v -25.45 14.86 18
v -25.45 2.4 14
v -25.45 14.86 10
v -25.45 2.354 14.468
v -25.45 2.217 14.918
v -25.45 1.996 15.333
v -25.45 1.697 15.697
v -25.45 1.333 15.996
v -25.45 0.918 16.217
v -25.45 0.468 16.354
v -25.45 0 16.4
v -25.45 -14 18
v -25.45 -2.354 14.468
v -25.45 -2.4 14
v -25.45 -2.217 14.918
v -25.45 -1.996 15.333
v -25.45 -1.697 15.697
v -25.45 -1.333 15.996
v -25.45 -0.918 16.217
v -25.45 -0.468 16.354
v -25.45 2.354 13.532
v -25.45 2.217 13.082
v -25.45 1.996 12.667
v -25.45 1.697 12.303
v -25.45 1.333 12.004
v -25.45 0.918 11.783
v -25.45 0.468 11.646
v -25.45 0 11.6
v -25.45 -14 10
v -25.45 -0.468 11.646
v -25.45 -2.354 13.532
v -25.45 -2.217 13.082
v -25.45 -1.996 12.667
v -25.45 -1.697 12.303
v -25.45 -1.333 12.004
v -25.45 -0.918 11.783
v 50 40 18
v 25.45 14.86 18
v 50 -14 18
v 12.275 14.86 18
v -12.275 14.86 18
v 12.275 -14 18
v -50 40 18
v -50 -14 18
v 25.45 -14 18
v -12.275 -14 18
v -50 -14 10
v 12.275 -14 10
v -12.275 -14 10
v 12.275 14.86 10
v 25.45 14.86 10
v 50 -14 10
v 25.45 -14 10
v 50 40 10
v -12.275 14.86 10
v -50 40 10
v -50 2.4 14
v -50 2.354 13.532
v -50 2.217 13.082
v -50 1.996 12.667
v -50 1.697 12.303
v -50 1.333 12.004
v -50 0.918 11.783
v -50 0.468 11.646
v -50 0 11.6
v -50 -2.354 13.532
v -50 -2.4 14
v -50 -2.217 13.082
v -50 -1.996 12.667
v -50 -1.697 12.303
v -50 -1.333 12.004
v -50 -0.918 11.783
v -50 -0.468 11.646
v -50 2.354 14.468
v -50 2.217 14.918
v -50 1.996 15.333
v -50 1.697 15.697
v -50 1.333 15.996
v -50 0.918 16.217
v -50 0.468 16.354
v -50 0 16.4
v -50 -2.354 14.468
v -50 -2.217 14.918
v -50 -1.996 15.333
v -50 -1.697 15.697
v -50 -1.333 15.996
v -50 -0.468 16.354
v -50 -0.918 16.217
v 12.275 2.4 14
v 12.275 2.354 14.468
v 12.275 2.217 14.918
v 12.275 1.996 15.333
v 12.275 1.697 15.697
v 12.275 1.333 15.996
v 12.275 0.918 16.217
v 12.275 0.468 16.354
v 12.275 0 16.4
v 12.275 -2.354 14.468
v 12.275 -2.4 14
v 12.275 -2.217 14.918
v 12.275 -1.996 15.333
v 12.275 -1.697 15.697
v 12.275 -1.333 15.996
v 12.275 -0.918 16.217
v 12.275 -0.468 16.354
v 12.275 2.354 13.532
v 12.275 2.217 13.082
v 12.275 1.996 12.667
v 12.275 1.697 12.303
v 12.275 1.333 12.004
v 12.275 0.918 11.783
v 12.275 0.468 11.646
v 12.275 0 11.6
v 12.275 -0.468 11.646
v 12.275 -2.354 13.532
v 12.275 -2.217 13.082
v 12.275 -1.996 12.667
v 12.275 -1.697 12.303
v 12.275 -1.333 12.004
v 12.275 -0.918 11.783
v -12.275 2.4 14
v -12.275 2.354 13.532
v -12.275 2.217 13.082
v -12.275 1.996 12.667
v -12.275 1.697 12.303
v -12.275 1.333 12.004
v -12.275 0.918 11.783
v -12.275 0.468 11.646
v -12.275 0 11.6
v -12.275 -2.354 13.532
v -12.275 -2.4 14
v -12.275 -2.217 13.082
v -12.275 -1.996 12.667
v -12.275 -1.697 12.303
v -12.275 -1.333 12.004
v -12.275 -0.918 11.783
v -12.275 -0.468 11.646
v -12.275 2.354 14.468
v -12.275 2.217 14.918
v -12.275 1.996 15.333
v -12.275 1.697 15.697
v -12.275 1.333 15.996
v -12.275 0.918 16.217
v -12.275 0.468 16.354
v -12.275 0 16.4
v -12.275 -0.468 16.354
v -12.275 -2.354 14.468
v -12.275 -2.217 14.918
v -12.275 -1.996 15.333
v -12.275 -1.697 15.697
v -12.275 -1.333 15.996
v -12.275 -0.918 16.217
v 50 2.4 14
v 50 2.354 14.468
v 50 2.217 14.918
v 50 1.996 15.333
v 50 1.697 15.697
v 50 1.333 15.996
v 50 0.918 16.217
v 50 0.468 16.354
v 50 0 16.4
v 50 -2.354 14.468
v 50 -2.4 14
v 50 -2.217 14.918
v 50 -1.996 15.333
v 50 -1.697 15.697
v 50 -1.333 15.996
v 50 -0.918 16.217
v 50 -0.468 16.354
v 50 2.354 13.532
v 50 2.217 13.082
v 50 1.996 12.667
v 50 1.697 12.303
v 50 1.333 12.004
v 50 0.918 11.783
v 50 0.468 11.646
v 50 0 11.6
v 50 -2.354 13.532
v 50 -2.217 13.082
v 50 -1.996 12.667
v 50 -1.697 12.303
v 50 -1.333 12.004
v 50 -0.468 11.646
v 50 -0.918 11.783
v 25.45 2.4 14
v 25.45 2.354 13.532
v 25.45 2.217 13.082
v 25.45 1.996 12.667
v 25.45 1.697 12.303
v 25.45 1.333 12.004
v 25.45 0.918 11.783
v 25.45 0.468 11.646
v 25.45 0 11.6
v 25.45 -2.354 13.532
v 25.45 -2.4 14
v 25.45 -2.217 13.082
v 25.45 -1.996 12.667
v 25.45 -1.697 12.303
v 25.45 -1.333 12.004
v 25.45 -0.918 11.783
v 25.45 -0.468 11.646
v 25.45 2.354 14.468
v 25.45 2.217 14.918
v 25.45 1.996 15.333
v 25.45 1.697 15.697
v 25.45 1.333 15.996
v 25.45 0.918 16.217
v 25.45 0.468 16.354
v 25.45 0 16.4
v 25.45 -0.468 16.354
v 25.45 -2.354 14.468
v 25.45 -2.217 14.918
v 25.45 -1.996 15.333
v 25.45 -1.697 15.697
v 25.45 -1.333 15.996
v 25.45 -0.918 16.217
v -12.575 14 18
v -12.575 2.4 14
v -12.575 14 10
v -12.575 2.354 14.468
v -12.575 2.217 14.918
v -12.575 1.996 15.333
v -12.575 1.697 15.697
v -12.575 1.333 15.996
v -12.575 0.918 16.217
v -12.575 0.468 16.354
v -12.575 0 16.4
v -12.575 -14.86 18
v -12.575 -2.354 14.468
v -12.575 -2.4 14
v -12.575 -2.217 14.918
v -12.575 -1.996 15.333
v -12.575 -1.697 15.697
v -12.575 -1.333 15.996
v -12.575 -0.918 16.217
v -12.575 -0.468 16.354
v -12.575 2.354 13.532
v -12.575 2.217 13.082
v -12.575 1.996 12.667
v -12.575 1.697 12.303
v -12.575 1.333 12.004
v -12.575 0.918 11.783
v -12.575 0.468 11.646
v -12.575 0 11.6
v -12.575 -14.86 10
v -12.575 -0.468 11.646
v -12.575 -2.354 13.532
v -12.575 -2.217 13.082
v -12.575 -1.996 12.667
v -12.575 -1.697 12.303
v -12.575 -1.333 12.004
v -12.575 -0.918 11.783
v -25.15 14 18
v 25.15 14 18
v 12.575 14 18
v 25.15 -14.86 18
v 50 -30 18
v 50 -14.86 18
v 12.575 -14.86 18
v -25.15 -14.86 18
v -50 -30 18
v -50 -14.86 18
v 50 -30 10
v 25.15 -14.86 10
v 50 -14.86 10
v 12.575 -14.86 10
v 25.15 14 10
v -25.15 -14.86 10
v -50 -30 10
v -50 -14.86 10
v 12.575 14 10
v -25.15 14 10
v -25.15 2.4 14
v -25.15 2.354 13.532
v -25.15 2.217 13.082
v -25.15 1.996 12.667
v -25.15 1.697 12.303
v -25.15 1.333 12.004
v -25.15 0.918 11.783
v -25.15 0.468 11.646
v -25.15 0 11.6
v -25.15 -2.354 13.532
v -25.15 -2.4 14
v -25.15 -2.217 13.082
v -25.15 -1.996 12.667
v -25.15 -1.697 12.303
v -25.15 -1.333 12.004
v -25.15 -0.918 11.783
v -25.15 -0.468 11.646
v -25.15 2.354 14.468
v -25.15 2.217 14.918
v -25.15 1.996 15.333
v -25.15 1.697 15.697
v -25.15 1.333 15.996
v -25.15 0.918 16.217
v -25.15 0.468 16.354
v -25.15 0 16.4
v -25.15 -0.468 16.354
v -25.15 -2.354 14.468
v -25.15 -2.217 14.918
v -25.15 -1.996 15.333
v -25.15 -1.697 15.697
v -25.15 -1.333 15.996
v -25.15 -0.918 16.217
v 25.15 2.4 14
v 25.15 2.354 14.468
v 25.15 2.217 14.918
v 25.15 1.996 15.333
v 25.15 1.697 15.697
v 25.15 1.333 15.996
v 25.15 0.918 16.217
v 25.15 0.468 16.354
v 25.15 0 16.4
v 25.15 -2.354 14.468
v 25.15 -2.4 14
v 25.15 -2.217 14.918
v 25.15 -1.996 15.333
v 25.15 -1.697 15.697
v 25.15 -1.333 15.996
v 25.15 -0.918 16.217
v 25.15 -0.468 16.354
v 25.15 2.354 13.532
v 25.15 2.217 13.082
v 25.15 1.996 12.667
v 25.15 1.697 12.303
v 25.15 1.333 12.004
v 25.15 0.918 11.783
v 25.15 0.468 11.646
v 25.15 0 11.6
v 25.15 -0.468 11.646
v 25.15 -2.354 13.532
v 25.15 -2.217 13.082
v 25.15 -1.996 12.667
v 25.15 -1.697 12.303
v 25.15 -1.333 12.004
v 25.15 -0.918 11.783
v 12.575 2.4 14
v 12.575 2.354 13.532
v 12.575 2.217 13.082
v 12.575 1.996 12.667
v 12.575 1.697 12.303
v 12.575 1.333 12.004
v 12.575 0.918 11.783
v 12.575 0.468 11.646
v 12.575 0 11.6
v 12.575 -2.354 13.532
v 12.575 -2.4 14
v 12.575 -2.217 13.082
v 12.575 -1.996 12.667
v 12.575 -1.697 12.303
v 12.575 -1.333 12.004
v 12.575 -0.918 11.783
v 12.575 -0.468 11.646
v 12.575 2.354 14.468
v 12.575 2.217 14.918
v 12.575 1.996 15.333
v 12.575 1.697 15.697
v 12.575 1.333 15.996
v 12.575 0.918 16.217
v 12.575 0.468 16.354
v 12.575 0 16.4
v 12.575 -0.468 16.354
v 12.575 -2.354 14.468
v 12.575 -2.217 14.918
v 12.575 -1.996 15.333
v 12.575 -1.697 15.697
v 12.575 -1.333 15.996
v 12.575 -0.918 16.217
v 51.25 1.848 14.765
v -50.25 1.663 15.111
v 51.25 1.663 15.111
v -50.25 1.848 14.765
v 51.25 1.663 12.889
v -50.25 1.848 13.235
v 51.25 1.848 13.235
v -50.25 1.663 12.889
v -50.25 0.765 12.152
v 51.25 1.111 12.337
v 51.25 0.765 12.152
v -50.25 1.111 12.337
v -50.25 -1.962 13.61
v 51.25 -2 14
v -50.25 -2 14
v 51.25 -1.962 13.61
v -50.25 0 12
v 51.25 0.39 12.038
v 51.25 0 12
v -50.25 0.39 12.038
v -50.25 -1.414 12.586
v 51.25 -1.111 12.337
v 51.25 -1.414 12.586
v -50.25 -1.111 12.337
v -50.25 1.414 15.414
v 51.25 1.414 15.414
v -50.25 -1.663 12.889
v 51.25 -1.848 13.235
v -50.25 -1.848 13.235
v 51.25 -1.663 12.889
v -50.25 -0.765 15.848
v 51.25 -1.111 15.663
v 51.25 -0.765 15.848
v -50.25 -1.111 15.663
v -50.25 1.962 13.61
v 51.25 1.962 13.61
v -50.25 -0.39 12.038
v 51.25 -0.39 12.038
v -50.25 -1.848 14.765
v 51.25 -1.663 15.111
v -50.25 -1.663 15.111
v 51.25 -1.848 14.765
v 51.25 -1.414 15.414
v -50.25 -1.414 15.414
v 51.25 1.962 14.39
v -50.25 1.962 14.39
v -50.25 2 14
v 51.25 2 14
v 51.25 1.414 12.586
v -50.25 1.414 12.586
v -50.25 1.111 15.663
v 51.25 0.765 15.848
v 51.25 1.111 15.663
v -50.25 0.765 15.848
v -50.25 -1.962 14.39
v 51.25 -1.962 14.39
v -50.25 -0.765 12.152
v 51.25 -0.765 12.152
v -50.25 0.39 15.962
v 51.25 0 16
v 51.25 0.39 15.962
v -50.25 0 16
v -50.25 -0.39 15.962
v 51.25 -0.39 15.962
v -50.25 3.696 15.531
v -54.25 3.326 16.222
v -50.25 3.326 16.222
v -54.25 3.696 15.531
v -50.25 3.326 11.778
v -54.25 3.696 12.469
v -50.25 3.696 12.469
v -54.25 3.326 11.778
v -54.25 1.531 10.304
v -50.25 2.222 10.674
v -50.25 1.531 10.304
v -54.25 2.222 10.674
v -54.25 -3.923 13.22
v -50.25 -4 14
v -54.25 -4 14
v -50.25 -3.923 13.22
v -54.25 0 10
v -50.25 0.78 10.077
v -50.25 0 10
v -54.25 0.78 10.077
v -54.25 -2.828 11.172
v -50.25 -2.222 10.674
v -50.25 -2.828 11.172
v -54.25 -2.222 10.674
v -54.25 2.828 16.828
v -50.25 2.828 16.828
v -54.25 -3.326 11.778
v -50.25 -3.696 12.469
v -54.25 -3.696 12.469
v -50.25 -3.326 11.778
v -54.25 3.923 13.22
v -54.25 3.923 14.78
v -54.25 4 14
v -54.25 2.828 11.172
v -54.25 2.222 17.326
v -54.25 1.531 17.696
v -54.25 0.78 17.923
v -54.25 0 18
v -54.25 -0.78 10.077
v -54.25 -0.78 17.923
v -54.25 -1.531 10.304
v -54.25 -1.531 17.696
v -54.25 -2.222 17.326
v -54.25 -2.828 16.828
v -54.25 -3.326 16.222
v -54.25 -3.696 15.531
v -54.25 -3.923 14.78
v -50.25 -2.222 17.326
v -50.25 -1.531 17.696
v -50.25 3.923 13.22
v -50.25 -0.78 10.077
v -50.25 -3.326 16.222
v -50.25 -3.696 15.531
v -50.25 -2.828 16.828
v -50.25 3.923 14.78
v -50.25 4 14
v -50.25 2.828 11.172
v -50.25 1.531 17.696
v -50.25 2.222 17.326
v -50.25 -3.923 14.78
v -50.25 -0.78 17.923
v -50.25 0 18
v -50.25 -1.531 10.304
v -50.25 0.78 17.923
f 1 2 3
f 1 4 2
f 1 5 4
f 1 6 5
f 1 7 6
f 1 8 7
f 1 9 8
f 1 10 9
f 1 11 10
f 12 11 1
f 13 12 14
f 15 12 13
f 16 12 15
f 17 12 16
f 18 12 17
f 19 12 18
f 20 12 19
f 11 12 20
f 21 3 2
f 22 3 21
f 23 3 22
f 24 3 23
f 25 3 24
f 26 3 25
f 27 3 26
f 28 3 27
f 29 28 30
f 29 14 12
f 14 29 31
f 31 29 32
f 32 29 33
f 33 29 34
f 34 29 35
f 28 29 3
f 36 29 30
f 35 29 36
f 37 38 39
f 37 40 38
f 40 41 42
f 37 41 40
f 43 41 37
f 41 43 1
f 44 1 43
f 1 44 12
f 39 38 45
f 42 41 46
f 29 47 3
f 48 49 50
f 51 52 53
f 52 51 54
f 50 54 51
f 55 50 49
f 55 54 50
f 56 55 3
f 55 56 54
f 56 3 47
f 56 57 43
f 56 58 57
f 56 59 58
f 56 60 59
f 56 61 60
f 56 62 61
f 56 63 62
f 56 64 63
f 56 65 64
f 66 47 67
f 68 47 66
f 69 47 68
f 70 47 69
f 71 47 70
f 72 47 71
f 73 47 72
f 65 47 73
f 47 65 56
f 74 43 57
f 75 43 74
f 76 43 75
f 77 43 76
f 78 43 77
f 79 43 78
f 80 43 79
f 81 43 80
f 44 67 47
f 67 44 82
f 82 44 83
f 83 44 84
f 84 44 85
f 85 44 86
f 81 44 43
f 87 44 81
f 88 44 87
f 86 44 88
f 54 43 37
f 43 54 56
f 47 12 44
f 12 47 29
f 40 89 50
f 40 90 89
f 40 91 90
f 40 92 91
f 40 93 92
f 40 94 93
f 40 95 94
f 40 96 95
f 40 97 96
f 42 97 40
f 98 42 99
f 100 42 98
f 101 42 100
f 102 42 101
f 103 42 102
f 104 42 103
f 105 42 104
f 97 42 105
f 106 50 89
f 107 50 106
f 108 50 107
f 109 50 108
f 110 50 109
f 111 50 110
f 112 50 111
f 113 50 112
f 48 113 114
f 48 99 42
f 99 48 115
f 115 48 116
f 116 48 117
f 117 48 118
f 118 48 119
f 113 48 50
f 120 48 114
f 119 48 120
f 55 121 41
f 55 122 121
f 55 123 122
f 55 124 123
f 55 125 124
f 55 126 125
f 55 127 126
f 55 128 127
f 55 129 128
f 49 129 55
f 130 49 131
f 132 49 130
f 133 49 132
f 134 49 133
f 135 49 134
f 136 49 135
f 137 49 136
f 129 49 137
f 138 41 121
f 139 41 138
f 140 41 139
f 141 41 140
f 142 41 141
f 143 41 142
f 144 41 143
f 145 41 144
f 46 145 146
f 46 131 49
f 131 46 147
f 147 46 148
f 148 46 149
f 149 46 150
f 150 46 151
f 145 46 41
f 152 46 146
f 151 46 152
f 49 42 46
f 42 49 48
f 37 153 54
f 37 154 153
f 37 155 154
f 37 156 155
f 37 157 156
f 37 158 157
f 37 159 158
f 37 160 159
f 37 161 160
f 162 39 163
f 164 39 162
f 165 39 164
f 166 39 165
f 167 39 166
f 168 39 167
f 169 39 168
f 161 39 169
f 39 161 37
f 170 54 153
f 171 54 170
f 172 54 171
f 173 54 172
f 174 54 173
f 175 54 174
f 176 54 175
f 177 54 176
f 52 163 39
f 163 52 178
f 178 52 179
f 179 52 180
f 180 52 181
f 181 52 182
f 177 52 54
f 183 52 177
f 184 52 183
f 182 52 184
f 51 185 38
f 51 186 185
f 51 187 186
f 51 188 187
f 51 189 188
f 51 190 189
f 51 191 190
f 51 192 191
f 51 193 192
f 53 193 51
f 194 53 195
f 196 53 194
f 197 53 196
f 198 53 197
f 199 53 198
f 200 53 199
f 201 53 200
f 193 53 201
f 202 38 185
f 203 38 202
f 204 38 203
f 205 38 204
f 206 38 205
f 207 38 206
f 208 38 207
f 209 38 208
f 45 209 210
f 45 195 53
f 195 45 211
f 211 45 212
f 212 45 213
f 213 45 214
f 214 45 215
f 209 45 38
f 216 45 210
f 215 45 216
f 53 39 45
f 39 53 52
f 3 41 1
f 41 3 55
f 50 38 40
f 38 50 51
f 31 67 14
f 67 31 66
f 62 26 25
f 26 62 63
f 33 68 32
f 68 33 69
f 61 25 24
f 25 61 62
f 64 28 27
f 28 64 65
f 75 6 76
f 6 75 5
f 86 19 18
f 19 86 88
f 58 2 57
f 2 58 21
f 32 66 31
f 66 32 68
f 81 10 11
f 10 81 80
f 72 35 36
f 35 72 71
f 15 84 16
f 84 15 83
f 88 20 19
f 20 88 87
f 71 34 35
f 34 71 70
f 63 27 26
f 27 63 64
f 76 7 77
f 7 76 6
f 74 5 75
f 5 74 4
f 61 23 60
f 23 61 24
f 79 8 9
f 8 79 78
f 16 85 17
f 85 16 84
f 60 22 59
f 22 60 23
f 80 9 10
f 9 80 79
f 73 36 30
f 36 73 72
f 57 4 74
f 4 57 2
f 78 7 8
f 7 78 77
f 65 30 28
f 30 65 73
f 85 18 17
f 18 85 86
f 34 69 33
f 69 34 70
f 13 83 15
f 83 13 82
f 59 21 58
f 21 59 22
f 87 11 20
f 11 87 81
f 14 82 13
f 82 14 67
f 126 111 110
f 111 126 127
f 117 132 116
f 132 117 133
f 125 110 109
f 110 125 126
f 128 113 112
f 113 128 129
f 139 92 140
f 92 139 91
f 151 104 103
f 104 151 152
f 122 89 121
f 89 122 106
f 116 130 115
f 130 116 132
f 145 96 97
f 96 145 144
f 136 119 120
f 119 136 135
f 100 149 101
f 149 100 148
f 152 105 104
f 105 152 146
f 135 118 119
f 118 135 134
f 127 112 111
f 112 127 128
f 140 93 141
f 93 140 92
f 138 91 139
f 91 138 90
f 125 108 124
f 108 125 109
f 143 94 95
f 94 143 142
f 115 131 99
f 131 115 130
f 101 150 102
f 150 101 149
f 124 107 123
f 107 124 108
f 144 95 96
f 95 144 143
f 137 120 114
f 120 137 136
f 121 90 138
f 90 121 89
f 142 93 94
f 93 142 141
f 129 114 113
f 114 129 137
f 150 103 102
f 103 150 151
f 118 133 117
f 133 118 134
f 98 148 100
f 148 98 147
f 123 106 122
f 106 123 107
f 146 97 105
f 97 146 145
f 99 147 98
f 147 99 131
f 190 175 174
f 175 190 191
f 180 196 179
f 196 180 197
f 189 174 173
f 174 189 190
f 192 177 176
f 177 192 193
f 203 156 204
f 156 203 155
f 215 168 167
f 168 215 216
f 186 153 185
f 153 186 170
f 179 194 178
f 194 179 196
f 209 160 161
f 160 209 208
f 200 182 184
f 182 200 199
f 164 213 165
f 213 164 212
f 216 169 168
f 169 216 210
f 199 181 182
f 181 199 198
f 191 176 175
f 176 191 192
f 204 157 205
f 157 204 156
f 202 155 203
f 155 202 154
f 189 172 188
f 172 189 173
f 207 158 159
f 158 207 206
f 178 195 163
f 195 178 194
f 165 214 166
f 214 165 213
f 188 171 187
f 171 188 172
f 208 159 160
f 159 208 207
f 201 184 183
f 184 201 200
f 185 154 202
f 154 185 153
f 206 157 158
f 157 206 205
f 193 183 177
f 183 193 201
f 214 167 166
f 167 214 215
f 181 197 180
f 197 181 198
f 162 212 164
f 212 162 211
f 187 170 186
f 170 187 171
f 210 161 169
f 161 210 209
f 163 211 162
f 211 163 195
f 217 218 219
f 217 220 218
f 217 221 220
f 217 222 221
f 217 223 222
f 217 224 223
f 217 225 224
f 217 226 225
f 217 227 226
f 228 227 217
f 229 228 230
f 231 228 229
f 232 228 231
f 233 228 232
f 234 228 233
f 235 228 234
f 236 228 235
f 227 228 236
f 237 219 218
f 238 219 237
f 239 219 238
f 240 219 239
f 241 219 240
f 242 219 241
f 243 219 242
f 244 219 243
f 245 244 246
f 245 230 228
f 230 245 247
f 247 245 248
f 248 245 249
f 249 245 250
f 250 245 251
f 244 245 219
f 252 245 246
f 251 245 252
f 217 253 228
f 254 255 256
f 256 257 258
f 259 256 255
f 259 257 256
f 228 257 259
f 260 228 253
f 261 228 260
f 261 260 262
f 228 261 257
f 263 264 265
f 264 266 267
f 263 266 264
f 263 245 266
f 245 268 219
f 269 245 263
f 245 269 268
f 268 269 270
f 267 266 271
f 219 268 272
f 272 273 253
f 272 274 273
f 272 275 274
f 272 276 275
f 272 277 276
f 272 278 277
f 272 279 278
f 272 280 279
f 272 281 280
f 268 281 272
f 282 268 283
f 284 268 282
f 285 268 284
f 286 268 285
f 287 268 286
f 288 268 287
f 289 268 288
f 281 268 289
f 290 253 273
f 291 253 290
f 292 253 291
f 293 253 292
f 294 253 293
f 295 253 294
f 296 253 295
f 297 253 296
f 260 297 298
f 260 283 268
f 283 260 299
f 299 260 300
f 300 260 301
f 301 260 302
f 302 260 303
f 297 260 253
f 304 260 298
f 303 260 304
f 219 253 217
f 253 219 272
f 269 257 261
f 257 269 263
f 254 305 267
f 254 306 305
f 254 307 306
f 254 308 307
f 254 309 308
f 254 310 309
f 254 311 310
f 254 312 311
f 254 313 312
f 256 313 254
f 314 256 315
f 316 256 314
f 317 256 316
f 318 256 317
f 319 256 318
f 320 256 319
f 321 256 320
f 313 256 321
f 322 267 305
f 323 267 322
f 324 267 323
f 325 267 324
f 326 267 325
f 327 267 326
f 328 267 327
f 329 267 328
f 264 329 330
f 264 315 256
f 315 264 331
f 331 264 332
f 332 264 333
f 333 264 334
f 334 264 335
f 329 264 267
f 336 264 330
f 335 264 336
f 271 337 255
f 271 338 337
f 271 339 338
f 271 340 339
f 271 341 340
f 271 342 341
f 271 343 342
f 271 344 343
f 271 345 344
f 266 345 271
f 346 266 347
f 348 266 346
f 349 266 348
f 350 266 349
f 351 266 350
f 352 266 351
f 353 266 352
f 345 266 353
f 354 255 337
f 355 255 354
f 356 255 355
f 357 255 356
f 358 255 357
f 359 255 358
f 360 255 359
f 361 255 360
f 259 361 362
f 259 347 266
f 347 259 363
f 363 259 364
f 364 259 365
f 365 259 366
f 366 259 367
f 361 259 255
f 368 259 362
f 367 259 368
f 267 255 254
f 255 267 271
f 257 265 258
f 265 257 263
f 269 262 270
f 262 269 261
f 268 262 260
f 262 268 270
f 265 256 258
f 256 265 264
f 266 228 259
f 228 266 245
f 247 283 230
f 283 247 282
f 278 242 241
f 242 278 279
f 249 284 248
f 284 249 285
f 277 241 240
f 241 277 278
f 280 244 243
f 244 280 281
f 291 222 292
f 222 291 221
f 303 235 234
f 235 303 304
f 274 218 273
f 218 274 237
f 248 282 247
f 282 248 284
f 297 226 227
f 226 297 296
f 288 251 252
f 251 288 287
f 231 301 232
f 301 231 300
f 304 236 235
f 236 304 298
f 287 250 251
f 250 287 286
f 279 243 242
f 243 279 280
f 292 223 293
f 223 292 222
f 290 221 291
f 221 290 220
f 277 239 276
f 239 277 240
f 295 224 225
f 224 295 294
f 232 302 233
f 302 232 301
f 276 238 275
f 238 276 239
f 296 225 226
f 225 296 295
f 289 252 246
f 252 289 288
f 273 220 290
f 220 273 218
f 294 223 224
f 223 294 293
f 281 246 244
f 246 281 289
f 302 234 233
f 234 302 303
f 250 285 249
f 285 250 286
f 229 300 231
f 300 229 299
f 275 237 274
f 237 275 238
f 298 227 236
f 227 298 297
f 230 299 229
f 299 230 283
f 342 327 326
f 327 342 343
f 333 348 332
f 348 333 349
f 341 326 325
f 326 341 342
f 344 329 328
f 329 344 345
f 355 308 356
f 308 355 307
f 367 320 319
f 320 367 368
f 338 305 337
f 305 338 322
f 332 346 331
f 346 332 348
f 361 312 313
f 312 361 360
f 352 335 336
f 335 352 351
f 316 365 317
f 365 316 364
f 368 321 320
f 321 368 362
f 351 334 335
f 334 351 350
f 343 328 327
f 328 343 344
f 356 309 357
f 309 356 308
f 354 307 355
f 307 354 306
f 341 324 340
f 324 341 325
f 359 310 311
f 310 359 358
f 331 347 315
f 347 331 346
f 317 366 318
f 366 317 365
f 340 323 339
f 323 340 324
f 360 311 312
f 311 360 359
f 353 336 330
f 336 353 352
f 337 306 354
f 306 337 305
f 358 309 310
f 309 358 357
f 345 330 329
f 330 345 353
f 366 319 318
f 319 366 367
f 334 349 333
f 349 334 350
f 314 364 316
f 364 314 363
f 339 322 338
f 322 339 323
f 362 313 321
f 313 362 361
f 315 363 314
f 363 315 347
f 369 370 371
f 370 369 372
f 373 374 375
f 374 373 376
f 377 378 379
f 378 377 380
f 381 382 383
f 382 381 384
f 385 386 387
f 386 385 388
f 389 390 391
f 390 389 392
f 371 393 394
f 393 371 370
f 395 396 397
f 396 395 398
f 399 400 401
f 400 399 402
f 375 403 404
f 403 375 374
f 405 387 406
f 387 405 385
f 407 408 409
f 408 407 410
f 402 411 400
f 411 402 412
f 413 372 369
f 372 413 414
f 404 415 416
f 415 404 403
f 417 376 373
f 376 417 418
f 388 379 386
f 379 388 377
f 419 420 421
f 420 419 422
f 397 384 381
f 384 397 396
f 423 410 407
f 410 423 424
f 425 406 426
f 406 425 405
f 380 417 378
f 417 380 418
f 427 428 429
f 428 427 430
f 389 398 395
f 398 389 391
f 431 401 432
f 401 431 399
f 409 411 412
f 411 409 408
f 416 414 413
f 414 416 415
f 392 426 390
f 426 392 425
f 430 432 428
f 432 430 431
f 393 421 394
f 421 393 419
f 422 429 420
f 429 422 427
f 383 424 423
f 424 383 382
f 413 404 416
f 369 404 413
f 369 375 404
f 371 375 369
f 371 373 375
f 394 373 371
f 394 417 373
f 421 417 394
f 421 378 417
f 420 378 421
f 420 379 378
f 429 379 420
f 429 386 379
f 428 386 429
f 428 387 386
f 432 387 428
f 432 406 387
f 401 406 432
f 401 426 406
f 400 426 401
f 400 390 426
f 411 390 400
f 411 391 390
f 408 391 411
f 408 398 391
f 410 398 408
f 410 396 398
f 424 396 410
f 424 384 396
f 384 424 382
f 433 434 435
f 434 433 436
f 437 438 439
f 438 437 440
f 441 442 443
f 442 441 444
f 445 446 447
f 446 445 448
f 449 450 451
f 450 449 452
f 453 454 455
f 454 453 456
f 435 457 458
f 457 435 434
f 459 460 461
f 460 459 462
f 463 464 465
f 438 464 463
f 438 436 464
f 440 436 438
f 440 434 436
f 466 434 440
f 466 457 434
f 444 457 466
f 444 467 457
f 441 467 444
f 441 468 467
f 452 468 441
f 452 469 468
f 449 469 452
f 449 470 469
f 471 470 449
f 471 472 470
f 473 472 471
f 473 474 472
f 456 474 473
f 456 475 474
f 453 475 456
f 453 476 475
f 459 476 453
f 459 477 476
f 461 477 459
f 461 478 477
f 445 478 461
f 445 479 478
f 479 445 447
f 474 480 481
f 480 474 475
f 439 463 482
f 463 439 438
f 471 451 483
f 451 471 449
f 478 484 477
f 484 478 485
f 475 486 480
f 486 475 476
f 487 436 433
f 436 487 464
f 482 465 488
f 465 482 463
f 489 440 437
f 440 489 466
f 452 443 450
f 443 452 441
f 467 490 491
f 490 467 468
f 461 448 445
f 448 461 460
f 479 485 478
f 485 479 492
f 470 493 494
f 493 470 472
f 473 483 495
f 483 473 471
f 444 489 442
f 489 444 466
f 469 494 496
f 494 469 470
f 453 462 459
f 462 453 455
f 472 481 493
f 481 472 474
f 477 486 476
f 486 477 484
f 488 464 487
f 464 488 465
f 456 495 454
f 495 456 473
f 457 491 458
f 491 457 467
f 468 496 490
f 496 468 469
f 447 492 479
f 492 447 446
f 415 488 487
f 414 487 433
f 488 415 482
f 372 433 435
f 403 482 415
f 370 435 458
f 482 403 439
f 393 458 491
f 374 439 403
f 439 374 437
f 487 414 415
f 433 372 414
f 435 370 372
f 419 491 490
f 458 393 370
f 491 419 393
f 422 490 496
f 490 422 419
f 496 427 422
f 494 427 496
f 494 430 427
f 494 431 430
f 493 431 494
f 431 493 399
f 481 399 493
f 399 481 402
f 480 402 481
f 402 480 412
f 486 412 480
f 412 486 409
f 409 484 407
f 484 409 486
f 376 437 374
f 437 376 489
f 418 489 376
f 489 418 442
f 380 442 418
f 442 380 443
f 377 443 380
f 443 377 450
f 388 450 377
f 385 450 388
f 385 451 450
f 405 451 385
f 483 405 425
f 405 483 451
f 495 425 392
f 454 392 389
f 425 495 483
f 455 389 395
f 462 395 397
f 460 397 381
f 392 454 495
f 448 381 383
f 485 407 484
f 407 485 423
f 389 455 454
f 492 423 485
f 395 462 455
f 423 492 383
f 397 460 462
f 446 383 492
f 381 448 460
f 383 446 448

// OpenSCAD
$fn = 32;

// ------------------------------------------------------------------------
// Butt hinge: hinge 100 mm, leaf swung 0 deg
// Every part is its own module, assembly() places every instance.
// ------------------------------------------------------------------------

// --- part 1 ---
module hinge_base() {
  difference() {
    union() {
      translate([-50, -14, -4]) cube([24.55, 54, 8]);
      translate([-12.275, -14, -4]) cube([24.55, 54, 8]);
      translate([25.45, -14, -4]) cube([24.55, 54, 8]);
      translate([-50, 14.86, -4]) cube([100, 25.14, 8]);
    }
    translate([-37.725, 0, 0]) rotate([0, 90, 0]) cylinder(h = 26.55, d = 4.8, center = true);
    translate([0, 0, 0]) rotate([0, 90, 0]) cylinder(h = 26.55, d = 4.8, center = true);
    translate([37.725, 0, 0]) rotate([0, 90, 0]) cylinder(h = 26.55, d = 4.8, center = true);
  }
}

// --- part 2 ---
module hinge_mover() {
  difference() {
    union() {
      translate([-25.15, -30, -4]) cube([12.575, 44, 8]);
      translate([12.575, -30, -4]) cube([12.575, 44, 8]);
      translate([-50, -30, -4]) cube([100, 15.14, 8]);
    }
    translate([-18.863, 0, 0]) rotate([0, 90, 0]) cylinder(h = 14.575, d = 4.8, center = true);
    translate([18.863, 0, 0]) rotate([0, 90, 0]) cylinder(h = 14.575, d = 4.8, center = true);
  }
}

// --- part 3 ---
module hinge_pin() {
  rotate([0, 90, 0]) cylinder(h = 102.5, d = 4, center = true);
  translate([-54.25, 0, 0]) rotate([0, 90, 0]) cylinder(h = 4, d = 8);
}

// --- assembly ---
module assembly() {
  color([0.80, 0.24, 0.20]) translate([0, 0, 14]) rotate([0, 0, 0]) hinge_base();
  color([0.20, 0.45, 0.75]) translate([0, 0, 14]) rotate([0, 0, 0]) hinge_mover();
  color([0.25, 0.62, 0.32]) translate([0, 0, 14]) rotate([0, 0, 0]) hinge_pin();
}

assembly();
